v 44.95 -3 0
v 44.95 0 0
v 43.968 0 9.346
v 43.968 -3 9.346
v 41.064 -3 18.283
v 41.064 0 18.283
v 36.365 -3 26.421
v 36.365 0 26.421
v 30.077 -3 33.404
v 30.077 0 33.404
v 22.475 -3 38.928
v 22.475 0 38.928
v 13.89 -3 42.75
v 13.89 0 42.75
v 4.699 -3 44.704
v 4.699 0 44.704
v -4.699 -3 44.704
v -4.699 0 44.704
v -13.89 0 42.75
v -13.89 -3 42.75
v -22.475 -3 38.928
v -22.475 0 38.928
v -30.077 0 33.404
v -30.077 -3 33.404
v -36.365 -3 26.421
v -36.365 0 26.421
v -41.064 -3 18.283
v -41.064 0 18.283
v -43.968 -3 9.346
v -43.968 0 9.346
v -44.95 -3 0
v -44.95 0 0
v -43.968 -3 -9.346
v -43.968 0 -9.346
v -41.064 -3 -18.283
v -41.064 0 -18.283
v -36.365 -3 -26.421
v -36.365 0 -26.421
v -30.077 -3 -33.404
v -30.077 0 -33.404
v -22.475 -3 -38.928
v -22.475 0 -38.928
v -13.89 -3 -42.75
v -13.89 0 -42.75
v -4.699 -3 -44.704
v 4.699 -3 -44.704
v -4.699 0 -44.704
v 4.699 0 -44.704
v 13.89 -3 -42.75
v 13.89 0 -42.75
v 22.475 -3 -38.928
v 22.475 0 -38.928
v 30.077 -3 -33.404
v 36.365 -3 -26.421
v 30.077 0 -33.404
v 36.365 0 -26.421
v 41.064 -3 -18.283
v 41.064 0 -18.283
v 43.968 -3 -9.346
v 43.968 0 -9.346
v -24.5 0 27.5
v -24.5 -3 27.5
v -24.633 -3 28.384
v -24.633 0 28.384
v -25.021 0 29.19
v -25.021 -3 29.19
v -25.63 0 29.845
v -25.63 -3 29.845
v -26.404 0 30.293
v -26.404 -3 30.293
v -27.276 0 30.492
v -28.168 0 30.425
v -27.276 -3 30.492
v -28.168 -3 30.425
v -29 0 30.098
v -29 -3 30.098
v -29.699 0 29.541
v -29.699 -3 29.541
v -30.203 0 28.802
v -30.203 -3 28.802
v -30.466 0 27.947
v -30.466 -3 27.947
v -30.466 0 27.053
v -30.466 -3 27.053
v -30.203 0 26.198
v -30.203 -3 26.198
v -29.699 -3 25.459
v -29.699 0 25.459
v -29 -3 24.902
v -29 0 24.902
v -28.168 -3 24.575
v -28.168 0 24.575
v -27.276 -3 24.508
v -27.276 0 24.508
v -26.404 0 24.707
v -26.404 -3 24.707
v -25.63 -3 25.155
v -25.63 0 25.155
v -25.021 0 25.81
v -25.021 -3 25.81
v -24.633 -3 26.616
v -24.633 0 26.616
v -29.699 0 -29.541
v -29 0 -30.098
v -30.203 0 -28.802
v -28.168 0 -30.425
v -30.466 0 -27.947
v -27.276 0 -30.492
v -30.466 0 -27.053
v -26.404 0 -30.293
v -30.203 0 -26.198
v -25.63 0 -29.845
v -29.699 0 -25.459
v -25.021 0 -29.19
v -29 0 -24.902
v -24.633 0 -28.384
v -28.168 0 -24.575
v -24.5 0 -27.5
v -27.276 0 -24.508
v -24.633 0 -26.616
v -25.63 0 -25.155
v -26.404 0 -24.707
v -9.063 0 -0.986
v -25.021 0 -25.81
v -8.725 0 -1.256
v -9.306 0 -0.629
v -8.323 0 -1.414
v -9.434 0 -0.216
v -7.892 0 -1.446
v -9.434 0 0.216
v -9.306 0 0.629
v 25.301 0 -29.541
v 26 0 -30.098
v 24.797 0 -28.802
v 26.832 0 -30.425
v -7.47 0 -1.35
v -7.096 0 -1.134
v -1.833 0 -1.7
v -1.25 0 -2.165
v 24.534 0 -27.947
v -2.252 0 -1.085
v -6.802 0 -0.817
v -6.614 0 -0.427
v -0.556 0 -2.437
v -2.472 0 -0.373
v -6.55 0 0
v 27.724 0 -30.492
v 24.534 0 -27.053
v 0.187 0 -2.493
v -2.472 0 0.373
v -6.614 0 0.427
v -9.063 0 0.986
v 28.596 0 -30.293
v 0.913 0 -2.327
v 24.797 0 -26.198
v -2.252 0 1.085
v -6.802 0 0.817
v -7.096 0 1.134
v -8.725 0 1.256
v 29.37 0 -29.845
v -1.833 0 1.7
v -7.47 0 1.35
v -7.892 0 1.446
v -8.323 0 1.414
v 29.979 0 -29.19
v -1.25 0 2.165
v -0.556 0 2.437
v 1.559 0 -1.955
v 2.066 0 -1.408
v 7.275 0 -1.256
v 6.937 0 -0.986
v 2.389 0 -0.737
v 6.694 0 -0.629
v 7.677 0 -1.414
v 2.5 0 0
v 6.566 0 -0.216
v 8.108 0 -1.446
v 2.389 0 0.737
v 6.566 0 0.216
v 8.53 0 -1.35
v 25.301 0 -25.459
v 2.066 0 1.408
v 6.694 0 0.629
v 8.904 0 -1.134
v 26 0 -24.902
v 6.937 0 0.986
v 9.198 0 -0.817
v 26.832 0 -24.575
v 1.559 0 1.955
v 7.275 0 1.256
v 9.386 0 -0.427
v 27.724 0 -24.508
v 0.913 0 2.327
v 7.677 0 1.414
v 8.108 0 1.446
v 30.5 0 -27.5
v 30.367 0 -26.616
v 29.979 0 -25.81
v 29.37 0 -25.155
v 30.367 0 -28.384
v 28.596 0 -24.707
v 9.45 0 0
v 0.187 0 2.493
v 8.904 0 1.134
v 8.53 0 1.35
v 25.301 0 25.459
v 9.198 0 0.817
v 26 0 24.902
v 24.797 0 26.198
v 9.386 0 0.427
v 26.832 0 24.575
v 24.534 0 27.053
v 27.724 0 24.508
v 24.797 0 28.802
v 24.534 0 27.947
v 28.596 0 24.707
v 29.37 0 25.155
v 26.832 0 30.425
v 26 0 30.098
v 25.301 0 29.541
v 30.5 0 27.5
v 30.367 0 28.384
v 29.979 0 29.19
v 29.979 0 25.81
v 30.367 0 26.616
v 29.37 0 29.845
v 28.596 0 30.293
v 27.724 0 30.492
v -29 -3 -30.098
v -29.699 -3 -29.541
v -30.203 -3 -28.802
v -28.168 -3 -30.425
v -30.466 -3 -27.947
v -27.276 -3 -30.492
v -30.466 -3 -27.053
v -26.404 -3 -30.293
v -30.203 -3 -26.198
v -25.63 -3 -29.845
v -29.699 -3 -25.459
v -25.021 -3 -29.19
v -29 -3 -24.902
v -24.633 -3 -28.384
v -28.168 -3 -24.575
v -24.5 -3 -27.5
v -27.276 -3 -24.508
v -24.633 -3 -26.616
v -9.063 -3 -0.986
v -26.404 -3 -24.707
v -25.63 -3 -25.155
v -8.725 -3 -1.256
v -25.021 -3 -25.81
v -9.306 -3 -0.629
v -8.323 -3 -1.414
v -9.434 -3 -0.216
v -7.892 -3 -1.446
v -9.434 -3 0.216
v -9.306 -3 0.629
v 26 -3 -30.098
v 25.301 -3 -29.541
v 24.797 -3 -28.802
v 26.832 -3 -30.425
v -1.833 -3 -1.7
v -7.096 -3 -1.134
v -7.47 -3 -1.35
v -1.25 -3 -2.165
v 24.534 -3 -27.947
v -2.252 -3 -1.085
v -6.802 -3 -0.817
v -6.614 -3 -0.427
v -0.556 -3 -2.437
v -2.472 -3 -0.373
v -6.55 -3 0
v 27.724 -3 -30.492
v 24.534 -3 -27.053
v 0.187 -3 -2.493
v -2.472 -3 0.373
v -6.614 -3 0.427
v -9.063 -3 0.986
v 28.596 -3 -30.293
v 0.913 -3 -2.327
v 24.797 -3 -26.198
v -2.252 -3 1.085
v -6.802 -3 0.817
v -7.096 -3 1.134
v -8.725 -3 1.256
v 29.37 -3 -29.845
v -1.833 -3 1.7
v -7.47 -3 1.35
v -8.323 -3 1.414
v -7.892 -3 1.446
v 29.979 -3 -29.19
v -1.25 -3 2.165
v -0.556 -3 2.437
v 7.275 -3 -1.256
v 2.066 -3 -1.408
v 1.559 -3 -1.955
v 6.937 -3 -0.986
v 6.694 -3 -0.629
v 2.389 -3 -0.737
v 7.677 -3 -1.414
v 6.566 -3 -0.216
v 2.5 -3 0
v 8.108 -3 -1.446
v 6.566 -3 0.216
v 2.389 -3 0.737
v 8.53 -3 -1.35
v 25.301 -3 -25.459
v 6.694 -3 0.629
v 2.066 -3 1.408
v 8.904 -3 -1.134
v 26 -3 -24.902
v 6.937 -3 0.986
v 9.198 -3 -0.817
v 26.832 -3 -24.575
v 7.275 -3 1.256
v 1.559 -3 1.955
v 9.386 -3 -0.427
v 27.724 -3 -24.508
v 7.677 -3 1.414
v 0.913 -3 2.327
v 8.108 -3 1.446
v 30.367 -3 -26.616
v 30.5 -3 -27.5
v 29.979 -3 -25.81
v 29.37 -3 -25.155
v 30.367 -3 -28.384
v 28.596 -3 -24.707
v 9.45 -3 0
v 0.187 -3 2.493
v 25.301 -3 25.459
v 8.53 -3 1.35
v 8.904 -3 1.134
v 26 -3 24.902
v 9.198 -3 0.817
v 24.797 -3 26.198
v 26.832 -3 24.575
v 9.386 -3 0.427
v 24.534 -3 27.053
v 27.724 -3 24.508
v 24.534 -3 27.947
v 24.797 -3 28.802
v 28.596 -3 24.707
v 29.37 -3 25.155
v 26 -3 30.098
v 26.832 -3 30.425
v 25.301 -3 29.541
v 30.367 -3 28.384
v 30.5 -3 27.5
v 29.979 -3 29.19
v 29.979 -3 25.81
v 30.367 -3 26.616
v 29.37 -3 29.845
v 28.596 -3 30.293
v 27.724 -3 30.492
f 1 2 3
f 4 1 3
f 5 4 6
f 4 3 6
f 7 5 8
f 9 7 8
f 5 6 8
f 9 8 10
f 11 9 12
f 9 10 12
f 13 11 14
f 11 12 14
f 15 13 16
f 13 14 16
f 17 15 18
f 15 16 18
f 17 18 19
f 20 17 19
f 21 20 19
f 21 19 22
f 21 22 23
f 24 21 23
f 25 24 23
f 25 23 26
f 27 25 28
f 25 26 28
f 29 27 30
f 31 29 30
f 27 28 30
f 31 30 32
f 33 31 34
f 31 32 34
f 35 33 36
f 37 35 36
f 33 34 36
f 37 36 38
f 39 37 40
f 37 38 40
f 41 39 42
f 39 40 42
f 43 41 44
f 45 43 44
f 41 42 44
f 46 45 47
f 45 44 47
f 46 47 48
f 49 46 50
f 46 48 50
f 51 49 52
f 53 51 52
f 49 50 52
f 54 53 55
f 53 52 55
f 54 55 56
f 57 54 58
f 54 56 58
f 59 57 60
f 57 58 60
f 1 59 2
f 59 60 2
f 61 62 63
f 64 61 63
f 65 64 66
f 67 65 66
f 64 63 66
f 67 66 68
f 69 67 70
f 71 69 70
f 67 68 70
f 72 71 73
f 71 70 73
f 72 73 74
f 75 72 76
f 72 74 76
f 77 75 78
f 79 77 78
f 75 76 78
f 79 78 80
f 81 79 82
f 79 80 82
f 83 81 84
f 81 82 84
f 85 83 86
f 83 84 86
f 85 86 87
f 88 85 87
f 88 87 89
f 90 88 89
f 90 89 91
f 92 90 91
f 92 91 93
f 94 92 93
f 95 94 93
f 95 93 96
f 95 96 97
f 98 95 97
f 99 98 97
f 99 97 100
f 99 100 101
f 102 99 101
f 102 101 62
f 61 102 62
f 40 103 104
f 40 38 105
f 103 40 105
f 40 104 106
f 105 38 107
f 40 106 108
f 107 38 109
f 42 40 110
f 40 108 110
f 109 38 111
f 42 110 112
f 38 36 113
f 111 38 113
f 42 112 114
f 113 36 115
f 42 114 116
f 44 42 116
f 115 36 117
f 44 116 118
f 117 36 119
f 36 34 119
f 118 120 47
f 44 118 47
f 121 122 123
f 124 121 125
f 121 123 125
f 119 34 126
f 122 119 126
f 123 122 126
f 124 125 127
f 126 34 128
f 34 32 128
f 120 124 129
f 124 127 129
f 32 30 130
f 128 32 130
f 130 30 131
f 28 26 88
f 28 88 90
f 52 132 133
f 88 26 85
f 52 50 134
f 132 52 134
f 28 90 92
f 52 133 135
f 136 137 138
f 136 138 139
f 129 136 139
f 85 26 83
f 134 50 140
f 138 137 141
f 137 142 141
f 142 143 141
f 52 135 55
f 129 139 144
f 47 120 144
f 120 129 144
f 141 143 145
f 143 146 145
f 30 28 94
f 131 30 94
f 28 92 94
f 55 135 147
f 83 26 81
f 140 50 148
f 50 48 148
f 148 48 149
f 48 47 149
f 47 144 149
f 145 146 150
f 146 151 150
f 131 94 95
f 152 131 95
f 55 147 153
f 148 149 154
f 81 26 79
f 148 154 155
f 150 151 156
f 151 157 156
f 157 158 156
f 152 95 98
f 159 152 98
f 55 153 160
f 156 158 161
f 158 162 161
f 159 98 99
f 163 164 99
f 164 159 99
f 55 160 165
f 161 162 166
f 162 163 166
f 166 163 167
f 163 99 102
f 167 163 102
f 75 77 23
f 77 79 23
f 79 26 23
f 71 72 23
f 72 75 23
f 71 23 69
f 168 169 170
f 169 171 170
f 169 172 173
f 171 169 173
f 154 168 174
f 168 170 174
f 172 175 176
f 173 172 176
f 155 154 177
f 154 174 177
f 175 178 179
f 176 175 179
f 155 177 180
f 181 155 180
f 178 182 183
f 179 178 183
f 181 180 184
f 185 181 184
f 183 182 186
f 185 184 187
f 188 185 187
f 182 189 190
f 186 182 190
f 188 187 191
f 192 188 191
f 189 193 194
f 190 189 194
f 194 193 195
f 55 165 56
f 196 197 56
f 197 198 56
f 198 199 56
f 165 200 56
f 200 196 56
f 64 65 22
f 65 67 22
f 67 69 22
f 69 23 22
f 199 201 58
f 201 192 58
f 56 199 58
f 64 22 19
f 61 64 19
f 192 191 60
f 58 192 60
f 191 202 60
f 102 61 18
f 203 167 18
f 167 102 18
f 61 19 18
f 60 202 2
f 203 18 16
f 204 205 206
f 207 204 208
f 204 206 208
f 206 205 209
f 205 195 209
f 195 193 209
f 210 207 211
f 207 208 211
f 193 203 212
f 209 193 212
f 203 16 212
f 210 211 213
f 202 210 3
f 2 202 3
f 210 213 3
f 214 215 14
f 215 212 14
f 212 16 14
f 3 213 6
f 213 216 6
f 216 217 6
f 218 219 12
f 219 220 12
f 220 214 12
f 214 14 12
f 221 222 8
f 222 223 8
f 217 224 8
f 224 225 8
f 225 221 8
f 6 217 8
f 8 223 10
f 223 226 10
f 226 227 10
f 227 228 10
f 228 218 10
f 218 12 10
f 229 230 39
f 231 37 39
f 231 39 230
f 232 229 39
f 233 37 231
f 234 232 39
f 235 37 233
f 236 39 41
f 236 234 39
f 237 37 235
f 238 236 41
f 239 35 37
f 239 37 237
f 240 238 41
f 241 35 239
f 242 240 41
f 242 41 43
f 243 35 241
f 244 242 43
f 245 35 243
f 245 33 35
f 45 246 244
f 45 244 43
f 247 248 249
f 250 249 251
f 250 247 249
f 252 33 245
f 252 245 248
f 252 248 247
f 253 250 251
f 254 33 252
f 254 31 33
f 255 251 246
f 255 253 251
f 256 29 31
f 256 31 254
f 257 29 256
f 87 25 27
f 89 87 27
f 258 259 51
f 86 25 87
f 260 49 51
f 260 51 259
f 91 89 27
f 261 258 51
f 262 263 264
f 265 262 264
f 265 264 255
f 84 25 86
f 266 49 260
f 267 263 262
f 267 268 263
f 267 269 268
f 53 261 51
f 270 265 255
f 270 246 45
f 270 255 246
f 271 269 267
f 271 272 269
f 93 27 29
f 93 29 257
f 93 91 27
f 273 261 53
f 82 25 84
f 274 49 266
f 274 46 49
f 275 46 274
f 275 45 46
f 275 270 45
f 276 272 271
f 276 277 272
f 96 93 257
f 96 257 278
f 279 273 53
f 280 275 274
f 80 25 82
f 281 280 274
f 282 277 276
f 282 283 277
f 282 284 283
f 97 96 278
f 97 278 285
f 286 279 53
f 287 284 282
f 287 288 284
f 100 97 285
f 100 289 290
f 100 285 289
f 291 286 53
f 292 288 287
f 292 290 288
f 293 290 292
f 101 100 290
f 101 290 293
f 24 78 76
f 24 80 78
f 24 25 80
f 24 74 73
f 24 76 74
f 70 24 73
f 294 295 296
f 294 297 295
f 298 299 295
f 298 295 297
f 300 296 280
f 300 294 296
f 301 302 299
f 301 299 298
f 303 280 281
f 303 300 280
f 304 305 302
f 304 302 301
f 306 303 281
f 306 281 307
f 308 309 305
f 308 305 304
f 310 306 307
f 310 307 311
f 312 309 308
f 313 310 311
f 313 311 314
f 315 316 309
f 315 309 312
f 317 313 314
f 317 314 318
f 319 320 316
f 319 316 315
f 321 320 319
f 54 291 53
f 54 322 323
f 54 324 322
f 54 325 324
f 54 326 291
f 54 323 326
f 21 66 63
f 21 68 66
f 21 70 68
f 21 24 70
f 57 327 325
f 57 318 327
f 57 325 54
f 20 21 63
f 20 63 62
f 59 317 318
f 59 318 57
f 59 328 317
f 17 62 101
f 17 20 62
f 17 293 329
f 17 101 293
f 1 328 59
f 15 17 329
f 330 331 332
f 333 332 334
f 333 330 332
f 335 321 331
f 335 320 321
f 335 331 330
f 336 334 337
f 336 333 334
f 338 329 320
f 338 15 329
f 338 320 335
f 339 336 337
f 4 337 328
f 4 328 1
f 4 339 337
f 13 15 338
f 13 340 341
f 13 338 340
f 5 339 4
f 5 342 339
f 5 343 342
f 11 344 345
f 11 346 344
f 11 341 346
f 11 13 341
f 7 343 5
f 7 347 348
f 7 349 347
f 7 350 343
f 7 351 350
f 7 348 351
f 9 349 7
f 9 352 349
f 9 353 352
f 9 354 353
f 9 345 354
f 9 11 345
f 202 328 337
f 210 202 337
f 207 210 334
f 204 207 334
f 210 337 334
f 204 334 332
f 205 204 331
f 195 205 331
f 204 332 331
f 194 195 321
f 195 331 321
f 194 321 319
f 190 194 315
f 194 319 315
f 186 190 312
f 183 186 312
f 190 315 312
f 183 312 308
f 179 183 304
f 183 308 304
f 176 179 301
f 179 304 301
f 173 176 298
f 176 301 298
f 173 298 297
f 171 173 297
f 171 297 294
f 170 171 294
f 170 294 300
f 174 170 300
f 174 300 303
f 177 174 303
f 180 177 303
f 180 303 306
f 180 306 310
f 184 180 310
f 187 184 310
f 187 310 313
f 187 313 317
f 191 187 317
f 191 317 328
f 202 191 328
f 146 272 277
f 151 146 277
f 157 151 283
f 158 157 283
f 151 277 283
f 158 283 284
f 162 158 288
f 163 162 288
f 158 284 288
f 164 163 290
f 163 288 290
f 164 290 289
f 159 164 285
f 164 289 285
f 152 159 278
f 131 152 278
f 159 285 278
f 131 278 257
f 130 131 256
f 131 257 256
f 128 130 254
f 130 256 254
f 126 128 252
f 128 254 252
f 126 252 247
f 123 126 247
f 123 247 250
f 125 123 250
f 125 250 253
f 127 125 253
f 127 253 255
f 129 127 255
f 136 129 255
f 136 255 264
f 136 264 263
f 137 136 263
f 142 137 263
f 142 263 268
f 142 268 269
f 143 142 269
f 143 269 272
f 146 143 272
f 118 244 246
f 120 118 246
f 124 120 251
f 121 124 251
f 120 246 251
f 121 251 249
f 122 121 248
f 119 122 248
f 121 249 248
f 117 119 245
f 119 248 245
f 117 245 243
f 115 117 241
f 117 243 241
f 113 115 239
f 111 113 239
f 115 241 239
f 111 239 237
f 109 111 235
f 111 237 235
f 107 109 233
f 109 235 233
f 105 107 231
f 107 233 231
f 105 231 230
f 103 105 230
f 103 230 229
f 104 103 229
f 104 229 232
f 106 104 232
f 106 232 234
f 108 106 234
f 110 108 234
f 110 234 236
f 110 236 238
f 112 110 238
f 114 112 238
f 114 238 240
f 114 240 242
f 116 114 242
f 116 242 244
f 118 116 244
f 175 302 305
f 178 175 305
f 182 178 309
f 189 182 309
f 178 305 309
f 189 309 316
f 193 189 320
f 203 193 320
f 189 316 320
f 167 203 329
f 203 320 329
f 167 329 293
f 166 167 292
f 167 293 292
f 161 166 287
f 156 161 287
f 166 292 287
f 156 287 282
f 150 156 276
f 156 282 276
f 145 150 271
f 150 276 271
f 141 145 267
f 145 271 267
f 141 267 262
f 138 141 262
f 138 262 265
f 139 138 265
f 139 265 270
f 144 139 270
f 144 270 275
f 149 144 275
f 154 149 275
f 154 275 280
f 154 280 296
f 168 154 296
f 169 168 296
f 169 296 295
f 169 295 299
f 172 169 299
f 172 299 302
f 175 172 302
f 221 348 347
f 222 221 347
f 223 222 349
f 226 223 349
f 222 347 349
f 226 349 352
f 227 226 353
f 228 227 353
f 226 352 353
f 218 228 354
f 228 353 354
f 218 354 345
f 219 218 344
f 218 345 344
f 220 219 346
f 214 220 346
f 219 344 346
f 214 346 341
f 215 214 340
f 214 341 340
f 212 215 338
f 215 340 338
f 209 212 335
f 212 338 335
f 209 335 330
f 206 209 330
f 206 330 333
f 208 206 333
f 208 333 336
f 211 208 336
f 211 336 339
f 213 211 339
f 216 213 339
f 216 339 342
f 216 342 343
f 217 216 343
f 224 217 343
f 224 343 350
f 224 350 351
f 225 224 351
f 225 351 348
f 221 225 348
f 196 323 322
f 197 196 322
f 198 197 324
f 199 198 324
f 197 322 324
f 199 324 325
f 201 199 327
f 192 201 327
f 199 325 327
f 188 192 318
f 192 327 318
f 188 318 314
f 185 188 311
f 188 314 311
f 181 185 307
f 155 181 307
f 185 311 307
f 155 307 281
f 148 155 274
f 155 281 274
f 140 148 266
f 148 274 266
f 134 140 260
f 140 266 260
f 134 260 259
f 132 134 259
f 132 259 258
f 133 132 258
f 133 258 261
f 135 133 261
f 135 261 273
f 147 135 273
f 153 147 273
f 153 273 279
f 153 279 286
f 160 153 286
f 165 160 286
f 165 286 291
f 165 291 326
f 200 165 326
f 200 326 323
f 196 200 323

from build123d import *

# Parameters (mm, degrees)
F0_R     = 44.95
F1_DEPTH = 3
F2_R     = 1.45
F2_R_2   = 2.5
F3_DEPTH = 3.001
F4_R     = 3
F5_DEPTH = 3.001


with BuildPart() as f1:
    # F0 (on Front) → F1 (new body)
    with BuildSketch(Plane.XZ):
        Circle(F0_R)
    extrude(amount=F1_DEPTH)

    # F2 (on face) → F3 (cut, through all)
    with BuildSketch(Plane.XZ.offset(3)):
        with Locations((-8, 0)):
            Circle(F2_R)
        with Locations((8, 0)):
            Circle(F2_R)
        Circle(F2_R_2)
    extrude(amount=-F3_DEPTH, mode=Mode.SUBTRACT)

    # F4 (on face) → F5 (cut, through all)
    with BuildSketch(Plane.XZ.offset(3)):
        with Locations((-27.5, 27.5)):
            Circle(F4_R)
        with Locations((27.5, 27.5)):
            Circle(F4_R)
        with Locations((-27.5, -27.5)):
            Circle(F4_R)
        with Locations((27.5, -27.5)):
            Circle(F4_R)
    extrude(amount=-F5_DEPTH, mode=Mode.SUBTRACT)


solid = f1.part
